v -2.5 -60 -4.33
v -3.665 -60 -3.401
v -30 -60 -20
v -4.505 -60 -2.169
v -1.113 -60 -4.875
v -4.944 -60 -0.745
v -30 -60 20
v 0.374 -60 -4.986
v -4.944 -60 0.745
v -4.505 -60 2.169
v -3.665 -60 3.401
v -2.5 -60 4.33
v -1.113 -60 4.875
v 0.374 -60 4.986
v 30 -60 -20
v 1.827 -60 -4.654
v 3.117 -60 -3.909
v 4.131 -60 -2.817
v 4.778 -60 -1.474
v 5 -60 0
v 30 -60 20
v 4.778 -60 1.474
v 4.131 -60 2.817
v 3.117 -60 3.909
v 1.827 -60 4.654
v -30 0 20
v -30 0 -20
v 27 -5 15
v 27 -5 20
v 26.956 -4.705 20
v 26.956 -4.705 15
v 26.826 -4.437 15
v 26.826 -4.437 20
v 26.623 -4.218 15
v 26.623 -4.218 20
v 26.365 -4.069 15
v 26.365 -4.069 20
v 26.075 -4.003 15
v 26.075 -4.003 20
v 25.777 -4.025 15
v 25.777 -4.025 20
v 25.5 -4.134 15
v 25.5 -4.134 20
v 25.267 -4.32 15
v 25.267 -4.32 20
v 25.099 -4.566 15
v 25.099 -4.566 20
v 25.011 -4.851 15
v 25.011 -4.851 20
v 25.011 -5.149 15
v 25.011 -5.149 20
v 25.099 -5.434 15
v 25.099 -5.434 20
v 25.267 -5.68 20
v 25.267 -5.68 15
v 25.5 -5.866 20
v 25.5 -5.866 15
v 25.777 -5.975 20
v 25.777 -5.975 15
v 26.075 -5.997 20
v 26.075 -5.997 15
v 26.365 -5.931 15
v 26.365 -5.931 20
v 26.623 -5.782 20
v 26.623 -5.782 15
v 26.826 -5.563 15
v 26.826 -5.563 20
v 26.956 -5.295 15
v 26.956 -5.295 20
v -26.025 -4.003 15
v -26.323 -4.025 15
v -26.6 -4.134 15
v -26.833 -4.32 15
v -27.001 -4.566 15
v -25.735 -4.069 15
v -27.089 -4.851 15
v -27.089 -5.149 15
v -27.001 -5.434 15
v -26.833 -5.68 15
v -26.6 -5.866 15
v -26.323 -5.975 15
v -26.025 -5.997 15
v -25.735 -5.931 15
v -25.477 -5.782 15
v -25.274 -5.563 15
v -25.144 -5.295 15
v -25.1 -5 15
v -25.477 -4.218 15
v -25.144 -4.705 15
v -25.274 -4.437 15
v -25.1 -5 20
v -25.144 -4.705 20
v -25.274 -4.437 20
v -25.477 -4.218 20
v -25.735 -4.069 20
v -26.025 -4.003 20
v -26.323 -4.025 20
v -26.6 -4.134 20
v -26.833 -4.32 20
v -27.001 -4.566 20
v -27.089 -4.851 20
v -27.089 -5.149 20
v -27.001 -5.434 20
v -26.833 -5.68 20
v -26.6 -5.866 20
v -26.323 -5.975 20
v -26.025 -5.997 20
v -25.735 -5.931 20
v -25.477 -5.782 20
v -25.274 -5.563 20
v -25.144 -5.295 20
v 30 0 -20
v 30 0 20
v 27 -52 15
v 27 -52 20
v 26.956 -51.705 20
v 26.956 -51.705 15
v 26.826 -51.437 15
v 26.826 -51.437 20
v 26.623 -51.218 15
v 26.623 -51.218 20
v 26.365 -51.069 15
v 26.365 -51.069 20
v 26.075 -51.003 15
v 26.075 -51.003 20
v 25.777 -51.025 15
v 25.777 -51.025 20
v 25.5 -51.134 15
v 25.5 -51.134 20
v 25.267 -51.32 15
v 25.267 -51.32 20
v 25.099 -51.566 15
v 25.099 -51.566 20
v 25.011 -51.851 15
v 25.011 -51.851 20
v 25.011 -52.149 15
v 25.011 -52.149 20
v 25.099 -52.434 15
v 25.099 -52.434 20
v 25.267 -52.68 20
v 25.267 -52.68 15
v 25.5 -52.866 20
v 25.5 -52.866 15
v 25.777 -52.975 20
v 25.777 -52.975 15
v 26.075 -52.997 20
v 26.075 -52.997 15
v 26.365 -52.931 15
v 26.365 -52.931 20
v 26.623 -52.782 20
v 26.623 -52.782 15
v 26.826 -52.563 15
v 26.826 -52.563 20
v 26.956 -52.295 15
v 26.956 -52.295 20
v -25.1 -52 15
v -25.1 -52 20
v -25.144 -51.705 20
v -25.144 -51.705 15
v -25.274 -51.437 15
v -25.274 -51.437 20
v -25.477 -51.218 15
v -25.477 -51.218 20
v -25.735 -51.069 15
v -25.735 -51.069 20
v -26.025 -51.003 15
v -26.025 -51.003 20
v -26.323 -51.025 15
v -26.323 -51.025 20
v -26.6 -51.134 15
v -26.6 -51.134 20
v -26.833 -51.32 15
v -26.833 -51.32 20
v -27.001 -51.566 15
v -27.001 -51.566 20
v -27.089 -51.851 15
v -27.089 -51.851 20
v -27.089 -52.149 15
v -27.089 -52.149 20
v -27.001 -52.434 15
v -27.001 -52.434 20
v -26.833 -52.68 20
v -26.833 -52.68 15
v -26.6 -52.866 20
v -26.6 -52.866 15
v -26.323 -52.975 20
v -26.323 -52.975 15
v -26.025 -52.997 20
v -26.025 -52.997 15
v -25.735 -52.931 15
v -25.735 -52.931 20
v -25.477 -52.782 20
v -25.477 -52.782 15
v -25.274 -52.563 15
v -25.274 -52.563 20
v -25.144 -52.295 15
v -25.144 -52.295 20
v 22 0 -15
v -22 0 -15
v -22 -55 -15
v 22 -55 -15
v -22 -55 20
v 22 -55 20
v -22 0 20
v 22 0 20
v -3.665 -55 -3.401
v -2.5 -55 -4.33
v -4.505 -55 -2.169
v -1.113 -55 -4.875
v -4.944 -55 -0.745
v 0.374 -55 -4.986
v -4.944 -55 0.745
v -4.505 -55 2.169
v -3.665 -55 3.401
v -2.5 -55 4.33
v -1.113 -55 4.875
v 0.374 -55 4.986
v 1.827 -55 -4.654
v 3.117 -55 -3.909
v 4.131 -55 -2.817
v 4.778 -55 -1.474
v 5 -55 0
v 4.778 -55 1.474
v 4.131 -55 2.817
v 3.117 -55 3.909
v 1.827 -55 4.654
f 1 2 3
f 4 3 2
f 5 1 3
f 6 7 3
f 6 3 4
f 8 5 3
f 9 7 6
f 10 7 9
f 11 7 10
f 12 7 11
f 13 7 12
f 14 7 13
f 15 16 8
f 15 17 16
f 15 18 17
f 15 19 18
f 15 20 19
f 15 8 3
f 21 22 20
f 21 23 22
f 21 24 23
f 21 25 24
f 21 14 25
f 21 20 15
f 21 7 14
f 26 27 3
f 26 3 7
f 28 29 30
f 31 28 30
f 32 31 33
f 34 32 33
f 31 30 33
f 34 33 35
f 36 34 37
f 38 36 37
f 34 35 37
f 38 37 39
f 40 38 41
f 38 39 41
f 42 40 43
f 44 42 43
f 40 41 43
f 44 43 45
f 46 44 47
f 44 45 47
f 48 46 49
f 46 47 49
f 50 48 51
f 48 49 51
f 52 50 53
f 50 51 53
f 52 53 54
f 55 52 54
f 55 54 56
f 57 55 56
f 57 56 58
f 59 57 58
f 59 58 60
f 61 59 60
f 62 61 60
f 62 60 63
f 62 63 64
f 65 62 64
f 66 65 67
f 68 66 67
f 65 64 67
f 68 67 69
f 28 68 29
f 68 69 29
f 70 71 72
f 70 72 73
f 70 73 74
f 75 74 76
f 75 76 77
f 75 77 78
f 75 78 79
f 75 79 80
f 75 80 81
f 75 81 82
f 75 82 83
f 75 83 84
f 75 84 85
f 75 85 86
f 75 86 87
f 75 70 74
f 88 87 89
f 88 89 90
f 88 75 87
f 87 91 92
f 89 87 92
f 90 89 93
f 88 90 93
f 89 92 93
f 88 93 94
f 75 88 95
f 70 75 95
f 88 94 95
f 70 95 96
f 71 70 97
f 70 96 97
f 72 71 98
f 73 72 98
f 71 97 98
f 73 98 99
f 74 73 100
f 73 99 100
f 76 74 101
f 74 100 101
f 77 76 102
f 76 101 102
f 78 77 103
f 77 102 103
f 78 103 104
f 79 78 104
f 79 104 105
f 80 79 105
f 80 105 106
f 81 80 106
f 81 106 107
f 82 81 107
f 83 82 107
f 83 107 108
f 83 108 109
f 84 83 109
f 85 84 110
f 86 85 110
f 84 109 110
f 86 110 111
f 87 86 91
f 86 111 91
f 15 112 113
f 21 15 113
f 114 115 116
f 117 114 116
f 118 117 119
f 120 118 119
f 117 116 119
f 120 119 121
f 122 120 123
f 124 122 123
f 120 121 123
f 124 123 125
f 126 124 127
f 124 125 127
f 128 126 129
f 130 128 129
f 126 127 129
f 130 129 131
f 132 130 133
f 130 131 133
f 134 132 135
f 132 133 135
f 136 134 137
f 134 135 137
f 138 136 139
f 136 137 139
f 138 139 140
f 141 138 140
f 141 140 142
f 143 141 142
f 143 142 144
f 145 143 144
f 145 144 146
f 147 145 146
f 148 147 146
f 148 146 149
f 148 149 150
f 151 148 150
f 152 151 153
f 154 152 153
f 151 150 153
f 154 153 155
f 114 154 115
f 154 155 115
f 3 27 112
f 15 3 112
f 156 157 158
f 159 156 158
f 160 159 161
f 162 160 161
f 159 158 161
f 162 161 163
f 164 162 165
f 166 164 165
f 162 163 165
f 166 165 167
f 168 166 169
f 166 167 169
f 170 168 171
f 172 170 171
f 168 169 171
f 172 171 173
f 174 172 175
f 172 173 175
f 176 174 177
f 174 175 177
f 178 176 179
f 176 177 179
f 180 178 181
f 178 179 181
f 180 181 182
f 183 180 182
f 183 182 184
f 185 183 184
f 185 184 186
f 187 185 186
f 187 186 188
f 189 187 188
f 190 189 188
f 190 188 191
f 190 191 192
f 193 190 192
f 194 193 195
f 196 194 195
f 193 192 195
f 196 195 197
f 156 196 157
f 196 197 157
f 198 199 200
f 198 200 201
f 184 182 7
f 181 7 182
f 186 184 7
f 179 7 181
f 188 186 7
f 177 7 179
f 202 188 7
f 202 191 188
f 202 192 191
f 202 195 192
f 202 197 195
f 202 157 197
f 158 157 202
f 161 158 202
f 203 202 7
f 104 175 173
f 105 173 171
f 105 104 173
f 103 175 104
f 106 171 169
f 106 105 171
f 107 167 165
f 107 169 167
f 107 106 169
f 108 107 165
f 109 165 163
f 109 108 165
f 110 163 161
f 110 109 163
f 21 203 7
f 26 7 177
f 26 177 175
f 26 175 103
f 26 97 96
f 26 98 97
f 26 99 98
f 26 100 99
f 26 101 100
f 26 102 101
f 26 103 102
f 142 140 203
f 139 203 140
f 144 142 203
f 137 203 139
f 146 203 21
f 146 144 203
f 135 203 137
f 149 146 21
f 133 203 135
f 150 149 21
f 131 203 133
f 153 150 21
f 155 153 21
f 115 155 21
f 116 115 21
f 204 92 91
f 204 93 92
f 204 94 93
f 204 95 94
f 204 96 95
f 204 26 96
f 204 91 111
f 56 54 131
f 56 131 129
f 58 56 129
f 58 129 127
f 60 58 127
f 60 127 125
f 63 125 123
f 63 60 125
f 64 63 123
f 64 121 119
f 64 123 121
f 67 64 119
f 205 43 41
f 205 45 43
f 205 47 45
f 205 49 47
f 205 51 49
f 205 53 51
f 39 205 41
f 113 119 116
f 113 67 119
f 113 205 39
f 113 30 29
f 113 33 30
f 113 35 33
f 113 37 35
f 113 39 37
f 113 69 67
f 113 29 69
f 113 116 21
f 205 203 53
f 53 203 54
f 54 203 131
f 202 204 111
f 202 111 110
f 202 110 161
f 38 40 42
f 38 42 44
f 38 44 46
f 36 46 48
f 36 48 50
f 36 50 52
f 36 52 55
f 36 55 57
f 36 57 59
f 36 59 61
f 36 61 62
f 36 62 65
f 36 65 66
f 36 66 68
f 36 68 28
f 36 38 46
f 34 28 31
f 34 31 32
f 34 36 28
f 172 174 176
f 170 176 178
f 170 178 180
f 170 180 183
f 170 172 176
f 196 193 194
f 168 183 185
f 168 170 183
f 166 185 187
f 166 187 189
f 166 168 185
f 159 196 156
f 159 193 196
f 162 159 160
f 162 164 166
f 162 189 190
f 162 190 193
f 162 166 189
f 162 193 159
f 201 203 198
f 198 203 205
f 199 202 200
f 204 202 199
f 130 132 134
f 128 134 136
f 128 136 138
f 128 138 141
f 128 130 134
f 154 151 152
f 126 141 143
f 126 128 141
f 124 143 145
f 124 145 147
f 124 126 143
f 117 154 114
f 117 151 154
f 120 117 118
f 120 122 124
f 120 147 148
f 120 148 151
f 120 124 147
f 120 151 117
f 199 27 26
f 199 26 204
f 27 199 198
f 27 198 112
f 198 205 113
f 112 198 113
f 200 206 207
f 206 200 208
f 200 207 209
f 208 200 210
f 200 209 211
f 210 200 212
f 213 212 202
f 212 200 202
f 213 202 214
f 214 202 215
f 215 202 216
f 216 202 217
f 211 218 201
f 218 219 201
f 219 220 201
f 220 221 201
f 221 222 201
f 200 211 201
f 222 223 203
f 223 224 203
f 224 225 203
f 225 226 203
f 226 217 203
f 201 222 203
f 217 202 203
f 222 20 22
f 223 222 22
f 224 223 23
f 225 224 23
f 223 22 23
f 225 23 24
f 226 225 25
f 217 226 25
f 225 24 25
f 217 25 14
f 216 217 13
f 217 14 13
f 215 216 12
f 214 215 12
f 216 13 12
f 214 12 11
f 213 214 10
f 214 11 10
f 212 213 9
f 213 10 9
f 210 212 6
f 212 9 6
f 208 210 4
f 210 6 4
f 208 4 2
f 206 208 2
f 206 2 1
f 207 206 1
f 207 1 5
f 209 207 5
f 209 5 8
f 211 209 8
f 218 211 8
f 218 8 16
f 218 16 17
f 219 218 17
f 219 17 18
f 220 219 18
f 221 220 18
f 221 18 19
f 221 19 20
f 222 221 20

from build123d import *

# Parameters (mm, degrees)
F0_W     = 60
F0_H     = 40
F1_DEPTH = 60
F2_W     = 44
F2_H     = 55
F3_DEPTH = 35
F4_R     = 5
F5_DEPTH = 25
F7_R     = 1
F8_DEPTH = 5


with BuildPart() as f1:
    # F0 (on Front) → F1 (new body)
    with BuildSketch(Plane.XZ):
        Rectangle(F0_W, F0_H)
    extrude(amount=F1_DEPTH)

    # F2 (on face) → F3 (cut)
    with BuildSketch(Plane.XY.offset(20)):
        with Locations((0, -27.5)):
            Rectangle(F2_W, F2_H)
    extrude(amount=-F3_DEPTH, mode=Mode.SUBTRACT)

    # F4 (on face) → F5 (cut)
    with BuildSketch(Plane.XZ.offset(60)):
        Circle(F4_R)
    extrude(amount=-F5_DEPTH, mode=Mode.SUBTRACT)

    # F7 (on face) → F8 (cut)
    with BuildSketch(Plane.XY.offset(20)):
        with Locations((-26.1, -5)):
            Circle(F7_R)
        with Locations((26, -5)):
            Circle(F7_R)
        with Locations((26, -52)):
            Circle(F7_R)
        with Locations((-26.1, -52)):
            Circle(F7_R)
    extrude(amount=-F8_DEPTH, mode=Mode.SUBTRACT)


solid = f1.part
